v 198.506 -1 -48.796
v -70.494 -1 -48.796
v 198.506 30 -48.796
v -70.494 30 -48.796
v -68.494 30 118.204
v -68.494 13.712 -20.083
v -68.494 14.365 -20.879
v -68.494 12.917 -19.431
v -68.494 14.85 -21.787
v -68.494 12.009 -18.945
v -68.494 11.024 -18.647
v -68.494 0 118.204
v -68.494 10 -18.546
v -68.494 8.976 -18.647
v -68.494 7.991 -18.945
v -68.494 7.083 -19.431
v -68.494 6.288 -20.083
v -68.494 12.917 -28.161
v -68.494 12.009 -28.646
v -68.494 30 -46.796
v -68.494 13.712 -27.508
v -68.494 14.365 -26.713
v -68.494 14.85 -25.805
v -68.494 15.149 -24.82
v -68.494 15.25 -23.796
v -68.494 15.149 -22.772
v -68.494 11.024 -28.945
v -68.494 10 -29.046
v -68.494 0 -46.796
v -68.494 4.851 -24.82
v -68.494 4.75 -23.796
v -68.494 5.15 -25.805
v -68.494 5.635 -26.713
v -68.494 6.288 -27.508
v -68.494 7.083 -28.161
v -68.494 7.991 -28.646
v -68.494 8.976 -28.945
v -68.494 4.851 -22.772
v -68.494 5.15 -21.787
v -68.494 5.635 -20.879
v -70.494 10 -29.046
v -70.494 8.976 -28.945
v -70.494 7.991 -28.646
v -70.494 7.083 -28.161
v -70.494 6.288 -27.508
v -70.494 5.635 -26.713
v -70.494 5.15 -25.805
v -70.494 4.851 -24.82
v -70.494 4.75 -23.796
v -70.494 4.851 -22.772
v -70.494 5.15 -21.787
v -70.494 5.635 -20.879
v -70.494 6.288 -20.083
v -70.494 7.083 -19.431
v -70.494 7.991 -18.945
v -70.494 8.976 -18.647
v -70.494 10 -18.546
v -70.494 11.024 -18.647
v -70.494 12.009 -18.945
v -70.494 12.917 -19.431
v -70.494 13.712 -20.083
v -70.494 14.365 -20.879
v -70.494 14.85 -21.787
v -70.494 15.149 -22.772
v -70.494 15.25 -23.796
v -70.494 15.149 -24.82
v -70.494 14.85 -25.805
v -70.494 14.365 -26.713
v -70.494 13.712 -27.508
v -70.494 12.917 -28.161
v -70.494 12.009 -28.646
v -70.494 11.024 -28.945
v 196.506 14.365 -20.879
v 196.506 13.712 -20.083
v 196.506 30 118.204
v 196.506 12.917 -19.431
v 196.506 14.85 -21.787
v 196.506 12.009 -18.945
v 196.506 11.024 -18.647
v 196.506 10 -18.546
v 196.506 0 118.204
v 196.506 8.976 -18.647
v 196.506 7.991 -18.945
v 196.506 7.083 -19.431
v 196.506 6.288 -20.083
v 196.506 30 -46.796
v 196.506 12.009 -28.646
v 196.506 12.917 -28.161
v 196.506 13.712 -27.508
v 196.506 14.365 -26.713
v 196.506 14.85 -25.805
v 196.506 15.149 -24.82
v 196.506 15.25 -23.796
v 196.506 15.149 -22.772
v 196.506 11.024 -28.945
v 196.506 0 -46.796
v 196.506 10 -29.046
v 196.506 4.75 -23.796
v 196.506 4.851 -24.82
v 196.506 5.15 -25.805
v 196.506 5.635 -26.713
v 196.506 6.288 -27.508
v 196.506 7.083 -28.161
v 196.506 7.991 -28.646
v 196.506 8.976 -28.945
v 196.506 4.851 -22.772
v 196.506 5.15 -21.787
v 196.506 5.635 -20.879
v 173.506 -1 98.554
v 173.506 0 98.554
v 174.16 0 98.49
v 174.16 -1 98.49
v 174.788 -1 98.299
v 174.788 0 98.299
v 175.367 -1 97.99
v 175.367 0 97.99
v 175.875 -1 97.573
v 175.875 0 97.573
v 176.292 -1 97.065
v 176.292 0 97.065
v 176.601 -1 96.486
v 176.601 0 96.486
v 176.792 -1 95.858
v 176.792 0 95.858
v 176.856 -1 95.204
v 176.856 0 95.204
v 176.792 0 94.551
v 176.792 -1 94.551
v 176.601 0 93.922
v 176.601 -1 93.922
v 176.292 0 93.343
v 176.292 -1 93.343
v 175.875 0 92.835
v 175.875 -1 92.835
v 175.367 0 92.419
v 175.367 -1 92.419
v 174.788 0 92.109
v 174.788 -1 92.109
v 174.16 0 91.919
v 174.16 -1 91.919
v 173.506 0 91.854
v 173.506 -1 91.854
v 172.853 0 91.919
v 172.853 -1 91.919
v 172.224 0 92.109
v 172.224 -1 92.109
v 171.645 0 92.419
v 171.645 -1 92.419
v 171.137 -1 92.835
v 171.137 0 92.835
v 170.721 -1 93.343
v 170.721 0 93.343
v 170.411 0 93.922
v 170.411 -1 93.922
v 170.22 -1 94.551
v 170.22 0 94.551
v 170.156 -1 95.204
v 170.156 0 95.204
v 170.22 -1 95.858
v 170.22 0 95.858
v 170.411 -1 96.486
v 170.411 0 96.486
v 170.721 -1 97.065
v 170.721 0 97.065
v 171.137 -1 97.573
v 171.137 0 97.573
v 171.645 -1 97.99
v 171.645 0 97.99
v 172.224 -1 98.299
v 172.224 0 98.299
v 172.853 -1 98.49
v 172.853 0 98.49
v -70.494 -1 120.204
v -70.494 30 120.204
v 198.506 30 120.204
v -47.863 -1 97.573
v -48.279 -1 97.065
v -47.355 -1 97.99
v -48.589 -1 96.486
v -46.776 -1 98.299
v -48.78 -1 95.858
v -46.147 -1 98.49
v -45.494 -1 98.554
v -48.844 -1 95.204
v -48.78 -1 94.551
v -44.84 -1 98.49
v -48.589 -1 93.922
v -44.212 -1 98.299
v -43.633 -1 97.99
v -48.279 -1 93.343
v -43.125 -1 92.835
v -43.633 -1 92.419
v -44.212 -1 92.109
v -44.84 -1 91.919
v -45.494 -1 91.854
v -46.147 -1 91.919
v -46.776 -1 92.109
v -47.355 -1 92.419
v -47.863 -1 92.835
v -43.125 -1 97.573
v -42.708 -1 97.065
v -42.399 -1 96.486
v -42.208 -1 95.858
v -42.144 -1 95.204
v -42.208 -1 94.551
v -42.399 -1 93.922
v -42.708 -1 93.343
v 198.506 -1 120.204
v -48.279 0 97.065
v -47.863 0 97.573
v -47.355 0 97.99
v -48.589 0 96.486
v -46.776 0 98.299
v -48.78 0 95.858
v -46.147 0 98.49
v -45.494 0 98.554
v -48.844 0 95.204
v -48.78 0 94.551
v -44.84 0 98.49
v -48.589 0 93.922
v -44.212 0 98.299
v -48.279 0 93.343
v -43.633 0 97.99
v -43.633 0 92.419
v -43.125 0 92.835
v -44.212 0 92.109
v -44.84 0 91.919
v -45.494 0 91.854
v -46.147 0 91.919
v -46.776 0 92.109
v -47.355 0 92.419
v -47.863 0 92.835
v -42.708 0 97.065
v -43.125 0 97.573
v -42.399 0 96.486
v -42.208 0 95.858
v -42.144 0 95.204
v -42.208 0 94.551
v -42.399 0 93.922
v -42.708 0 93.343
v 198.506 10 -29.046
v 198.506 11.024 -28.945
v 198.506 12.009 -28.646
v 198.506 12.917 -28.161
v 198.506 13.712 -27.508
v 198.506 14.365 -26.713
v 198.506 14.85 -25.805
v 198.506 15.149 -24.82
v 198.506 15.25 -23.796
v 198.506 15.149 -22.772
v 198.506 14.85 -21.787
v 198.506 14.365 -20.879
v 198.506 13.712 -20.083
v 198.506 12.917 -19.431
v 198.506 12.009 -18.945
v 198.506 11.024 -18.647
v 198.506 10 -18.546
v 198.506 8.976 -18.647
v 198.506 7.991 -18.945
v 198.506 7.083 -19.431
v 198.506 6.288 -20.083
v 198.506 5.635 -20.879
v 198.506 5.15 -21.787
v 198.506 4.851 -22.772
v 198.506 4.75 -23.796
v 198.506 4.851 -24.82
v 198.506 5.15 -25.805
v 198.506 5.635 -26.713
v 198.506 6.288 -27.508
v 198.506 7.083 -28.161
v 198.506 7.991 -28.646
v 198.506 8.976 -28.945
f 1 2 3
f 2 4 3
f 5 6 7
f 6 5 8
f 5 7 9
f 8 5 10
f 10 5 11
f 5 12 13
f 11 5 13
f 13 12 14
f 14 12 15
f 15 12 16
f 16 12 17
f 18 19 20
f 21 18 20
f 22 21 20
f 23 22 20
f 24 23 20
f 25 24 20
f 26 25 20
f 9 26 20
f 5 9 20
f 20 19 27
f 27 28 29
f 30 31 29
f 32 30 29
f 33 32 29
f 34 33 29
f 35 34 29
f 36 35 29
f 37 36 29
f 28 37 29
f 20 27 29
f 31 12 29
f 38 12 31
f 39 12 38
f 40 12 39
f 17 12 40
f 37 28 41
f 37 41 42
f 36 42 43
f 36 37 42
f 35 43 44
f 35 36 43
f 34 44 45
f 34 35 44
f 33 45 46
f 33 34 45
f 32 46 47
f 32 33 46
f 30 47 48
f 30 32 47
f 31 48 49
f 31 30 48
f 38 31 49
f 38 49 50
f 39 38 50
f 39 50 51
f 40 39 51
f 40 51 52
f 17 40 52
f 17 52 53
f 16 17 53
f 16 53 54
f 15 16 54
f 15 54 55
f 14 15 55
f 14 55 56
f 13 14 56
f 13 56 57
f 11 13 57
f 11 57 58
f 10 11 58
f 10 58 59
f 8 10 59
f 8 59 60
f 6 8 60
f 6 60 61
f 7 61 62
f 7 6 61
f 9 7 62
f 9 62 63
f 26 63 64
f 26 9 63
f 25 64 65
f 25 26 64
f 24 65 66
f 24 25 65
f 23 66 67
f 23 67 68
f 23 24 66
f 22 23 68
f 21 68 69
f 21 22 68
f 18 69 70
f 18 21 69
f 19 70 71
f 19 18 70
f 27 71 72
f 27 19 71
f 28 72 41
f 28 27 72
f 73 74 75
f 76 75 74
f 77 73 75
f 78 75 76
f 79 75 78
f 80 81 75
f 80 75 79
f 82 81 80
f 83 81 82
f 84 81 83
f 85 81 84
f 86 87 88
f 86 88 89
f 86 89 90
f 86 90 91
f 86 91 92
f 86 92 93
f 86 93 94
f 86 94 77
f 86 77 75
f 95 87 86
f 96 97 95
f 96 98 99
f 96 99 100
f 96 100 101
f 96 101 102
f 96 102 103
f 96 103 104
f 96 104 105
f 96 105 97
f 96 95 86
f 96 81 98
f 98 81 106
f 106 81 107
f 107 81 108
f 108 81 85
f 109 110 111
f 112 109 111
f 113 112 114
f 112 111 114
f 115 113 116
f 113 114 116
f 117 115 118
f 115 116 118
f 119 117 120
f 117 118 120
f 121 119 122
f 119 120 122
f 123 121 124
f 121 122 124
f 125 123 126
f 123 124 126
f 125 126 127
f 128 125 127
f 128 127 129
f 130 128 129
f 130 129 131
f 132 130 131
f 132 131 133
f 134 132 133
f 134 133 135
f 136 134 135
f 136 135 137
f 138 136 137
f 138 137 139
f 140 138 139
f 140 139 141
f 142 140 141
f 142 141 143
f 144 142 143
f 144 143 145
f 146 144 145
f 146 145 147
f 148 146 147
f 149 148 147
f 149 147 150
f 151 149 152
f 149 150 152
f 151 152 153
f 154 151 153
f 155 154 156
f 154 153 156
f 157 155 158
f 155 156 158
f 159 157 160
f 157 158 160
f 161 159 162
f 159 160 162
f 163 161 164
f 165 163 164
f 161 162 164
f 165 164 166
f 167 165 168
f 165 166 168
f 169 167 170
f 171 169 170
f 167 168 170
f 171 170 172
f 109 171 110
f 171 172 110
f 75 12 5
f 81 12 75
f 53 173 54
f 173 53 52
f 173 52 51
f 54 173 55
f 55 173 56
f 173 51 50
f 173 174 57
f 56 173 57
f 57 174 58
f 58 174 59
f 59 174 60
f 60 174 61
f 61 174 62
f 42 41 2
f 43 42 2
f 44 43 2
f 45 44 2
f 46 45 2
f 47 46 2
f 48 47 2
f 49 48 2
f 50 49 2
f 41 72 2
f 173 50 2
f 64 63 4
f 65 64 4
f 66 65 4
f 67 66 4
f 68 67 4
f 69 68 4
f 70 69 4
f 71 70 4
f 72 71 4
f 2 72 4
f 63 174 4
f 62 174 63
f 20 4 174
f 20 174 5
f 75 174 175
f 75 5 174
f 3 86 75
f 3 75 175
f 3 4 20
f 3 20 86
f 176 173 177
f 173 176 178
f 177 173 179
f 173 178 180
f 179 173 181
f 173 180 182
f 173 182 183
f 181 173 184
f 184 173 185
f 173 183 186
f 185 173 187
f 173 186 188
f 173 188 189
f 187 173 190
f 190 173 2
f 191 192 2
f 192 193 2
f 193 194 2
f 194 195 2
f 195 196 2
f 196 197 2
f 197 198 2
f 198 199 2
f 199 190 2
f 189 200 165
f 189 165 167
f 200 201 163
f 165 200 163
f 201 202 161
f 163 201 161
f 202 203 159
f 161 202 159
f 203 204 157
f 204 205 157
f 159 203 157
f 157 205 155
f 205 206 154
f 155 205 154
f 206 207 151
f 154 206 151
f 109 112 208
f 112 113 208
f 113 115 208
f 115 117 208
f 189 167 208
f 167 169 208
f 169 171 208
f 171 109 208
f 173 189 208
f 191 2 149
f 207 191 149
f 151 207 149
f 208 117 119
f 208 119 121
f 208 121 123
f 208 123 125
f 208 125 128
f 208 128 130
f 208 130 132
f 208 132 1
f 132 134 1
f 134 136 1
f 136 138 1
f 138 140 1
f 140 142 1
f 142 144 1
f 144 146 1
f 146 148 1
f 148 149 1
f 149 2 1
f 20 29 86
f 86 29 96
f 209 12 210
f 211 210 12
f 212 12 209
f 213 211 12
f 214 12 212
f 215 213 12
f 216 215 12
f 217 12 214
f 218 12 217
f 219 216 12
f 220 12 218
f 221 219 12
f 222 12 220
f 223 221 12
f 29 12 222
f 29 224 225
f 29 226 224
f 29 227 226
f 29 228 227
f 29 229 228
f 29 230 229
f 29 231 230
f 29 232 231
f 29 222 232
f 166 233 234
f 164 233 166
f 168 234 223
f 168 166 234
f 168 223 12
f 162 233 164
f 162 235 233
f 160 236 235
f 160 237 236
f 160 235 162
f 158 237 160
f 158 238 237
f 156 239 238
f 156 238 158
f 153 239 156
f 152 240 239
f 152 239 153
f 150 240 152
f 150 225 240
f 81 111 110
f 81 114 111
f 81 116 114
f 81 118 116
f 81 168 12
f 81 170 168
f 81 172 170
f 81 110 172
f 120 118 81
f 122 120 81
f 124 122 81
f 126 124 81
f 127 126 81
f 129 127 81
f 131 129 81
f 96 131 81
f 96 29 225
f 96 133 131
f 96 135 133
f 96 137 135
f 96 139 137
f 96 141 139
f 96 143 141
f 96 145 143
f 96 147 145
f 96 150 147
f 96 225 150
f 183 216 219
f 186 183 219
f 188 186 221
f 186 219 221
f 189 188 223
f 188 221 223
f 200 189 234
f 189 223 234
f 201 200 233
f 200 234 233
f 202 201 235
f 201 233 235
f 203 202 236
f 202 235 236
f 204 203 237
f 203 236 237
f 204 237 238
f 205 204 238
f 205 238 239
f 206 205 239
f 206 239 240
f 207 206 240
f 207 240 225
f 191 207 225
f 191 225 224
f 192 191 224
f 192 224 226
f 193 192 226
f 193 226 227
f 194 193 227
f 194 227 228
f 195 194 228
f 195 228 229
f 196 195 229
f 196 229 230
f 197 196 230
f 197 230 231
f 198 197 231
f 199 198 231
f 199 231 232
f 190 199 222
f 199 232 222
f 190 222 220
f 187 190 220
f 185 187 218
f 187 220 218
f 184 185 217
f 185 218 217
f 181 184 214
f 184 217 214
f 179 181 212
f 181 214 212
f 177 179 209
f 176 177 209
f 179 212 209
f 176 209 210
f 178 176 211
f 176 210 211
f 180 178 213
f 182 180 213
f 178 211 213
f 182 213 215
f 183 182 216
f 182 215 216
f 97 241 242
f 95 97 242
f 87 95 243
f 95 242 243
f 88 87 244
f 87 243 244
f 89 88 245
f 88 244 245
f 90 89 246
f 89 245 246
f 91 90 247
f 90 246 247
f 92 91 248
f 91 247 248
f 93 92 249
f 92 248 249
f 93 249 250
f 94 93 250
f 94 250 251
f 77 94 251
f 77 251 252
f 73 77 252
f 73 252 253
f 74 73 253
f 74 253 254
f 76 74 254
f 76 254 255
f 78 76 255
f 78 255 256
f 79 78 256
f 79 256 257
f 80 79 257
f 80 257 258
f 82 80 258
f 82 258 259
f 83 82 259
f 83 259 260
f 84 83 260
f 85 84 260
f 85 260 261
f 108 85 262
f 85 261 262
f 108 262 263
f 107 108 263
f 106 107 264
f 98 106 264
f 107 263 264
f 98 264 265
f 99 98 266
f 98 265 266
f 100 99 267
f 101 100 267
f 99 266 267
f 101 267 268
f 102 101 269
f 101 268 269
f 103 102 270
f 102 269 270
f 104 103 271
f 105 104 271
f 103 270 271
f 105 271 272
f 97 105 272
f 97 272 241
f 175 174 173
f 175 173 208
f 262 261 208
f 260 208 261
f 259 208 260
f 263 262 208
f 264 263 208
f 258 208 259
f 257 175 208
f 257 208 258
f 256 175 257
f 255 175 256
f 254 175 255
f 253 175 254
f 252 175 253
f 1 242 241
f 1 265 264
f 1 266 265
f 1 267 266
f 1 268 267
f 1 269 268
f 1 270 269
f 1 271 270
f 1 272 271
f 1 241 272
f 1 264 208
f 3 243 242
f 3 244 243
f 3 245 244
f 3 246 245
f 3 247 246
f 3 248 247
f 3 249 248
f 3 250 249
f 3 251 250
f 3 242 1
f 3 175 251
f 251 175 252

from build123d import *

# Parameters (mm, degrees)
SKETCH2_W           = 269
SKETCH2_H           = 169
SKETCH2_W_2         = 265
SKETCH2_H_2         = 165
WALLS_DEPTH         = 30
SKETCH2_2_W         = 269
SKETCH2_2_H         = 169
BASE_DEPTH          = 1
SKETCH4_R           = 5.25
MOTOR_WHEEL_DEPTH   = 10
MOTOR_WHEEL2_START  = -10
SKETCH3_R           = 5.25
MOTOR_WHEEL2_DEPTH  = 10
SKETCH6_R           = 3.35
CASTER_WHEELS_DEPTH = 10


with BuildPart() as part:
    # Sketch2 → Walls (new body)
    with BuildSketch(Plane(origin=(0, 0, 0), x_dir=(1, 0, 0), z_dir=(0, 1, 0))):
        with Locations((64.006127086, -35.704235294)):
            Rectangle(SKETCH2_W, SKETCH2_H)
        with Locations((64.006127086, -35.704235294)):
            Rectangle(SKETCH2_W_2, SKETCH2_H_2, mode=Mode.SUBTRACT)
    extrude(amount=WALLS_DEPTH)

    # Sketch2<2> → Base (add)
    with BuildSketch(Plane(origin=(0, 0, 0), x_dir=(1, 0, 0), z_dir=(0, 1, 0))):
        with Locations((64.006127086, -35.704235294)):
            Rectangle(SKETCH2_2_W, SKETCH2_2_H)
    extrude(amount=-BASE_DEPTH)

    # Sketch4 → Motor-Wheel (cut)
    with BuildSketch(Plane(origin=(198.506127086, 0, 0), x_dir=(0, 0, -1), z_dir=(1, 0, 0))):
        with Locations((23.795764706, 10)):
            Circle(SKETCH4_R)
    extrude(amount=-MOTOR_WHEEL_DEPTH, mode=Mode.SUBTRACT)

    # Sketch3 → Motor-Wheel2 (cut)
    with BuildSketch(Plane.ZY.offset(70.493872914).offset(MOTOR_WHEEL2_START)):
        with Locations((-23.795764706, 10)):
            Circle(SKETCH3_R)
    extrude(amount=MOTOR_WHEEL2_DEPTH, mode=Mode.SUBTRACT)

    # Sketch6 → Caster Wheels (cut)
    with BuildSketch(Plane(origin=(0, 0, 0), x_dir=(1, 0, 0), z_dir=(0, 1, 0))):
        with Locations((-45.493872914, -95.204235294)):
            Circle(SKETCH6_R)
        with Locations((173.506127086, -95.204235294)):
            Circle(SKETCH6_R)
    extrude(amount=-CASTER_WHEELS_DEPTH, mode=Mode.SUBTRACT)


solid = part.part
